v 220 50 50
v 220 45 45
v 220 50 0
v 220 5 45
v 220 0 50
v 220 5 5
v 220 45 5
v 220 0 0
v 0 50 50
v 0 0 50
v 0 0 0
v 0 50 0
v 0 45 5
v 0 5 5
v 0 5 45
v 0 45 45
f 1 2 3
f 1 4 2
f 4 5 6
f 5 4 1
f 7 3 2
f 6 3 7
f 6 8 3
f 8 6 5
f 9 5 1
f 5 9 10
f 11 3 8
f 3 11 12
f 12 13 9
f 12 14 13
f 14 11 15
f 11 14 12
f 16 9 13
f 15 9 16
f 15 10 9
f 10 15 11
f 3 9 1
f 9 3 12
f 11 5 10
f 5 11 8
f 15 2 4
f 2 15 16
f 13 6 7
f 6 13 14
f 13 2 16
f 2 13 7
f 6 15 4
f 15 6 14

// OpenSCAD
$fn = 32;

// ----------------------------------------------------------------------
// Box beam: 200-250 mm hollow beam
// ----------------------------------------------------------------------

// --- parameters (mm) ---
beam_l = 220;             // beam length, X
beam_w = 50;              // beam width, Y
beam_h = 50;              // beam height, Z
wall = 5;                 // wall thickness
fit_tol = 0.05;           // tolerance for press fits, mm
free_tol = 0.2;           // tolerance for clearance fits, mm

difference() {
  cube([beam_l, beam_w, beam_h]);
  translate([-1, wall, wall])
    cube([beam_l + 2, beam_w - 2 * wall, beam_h - 2 * wall]);
}
